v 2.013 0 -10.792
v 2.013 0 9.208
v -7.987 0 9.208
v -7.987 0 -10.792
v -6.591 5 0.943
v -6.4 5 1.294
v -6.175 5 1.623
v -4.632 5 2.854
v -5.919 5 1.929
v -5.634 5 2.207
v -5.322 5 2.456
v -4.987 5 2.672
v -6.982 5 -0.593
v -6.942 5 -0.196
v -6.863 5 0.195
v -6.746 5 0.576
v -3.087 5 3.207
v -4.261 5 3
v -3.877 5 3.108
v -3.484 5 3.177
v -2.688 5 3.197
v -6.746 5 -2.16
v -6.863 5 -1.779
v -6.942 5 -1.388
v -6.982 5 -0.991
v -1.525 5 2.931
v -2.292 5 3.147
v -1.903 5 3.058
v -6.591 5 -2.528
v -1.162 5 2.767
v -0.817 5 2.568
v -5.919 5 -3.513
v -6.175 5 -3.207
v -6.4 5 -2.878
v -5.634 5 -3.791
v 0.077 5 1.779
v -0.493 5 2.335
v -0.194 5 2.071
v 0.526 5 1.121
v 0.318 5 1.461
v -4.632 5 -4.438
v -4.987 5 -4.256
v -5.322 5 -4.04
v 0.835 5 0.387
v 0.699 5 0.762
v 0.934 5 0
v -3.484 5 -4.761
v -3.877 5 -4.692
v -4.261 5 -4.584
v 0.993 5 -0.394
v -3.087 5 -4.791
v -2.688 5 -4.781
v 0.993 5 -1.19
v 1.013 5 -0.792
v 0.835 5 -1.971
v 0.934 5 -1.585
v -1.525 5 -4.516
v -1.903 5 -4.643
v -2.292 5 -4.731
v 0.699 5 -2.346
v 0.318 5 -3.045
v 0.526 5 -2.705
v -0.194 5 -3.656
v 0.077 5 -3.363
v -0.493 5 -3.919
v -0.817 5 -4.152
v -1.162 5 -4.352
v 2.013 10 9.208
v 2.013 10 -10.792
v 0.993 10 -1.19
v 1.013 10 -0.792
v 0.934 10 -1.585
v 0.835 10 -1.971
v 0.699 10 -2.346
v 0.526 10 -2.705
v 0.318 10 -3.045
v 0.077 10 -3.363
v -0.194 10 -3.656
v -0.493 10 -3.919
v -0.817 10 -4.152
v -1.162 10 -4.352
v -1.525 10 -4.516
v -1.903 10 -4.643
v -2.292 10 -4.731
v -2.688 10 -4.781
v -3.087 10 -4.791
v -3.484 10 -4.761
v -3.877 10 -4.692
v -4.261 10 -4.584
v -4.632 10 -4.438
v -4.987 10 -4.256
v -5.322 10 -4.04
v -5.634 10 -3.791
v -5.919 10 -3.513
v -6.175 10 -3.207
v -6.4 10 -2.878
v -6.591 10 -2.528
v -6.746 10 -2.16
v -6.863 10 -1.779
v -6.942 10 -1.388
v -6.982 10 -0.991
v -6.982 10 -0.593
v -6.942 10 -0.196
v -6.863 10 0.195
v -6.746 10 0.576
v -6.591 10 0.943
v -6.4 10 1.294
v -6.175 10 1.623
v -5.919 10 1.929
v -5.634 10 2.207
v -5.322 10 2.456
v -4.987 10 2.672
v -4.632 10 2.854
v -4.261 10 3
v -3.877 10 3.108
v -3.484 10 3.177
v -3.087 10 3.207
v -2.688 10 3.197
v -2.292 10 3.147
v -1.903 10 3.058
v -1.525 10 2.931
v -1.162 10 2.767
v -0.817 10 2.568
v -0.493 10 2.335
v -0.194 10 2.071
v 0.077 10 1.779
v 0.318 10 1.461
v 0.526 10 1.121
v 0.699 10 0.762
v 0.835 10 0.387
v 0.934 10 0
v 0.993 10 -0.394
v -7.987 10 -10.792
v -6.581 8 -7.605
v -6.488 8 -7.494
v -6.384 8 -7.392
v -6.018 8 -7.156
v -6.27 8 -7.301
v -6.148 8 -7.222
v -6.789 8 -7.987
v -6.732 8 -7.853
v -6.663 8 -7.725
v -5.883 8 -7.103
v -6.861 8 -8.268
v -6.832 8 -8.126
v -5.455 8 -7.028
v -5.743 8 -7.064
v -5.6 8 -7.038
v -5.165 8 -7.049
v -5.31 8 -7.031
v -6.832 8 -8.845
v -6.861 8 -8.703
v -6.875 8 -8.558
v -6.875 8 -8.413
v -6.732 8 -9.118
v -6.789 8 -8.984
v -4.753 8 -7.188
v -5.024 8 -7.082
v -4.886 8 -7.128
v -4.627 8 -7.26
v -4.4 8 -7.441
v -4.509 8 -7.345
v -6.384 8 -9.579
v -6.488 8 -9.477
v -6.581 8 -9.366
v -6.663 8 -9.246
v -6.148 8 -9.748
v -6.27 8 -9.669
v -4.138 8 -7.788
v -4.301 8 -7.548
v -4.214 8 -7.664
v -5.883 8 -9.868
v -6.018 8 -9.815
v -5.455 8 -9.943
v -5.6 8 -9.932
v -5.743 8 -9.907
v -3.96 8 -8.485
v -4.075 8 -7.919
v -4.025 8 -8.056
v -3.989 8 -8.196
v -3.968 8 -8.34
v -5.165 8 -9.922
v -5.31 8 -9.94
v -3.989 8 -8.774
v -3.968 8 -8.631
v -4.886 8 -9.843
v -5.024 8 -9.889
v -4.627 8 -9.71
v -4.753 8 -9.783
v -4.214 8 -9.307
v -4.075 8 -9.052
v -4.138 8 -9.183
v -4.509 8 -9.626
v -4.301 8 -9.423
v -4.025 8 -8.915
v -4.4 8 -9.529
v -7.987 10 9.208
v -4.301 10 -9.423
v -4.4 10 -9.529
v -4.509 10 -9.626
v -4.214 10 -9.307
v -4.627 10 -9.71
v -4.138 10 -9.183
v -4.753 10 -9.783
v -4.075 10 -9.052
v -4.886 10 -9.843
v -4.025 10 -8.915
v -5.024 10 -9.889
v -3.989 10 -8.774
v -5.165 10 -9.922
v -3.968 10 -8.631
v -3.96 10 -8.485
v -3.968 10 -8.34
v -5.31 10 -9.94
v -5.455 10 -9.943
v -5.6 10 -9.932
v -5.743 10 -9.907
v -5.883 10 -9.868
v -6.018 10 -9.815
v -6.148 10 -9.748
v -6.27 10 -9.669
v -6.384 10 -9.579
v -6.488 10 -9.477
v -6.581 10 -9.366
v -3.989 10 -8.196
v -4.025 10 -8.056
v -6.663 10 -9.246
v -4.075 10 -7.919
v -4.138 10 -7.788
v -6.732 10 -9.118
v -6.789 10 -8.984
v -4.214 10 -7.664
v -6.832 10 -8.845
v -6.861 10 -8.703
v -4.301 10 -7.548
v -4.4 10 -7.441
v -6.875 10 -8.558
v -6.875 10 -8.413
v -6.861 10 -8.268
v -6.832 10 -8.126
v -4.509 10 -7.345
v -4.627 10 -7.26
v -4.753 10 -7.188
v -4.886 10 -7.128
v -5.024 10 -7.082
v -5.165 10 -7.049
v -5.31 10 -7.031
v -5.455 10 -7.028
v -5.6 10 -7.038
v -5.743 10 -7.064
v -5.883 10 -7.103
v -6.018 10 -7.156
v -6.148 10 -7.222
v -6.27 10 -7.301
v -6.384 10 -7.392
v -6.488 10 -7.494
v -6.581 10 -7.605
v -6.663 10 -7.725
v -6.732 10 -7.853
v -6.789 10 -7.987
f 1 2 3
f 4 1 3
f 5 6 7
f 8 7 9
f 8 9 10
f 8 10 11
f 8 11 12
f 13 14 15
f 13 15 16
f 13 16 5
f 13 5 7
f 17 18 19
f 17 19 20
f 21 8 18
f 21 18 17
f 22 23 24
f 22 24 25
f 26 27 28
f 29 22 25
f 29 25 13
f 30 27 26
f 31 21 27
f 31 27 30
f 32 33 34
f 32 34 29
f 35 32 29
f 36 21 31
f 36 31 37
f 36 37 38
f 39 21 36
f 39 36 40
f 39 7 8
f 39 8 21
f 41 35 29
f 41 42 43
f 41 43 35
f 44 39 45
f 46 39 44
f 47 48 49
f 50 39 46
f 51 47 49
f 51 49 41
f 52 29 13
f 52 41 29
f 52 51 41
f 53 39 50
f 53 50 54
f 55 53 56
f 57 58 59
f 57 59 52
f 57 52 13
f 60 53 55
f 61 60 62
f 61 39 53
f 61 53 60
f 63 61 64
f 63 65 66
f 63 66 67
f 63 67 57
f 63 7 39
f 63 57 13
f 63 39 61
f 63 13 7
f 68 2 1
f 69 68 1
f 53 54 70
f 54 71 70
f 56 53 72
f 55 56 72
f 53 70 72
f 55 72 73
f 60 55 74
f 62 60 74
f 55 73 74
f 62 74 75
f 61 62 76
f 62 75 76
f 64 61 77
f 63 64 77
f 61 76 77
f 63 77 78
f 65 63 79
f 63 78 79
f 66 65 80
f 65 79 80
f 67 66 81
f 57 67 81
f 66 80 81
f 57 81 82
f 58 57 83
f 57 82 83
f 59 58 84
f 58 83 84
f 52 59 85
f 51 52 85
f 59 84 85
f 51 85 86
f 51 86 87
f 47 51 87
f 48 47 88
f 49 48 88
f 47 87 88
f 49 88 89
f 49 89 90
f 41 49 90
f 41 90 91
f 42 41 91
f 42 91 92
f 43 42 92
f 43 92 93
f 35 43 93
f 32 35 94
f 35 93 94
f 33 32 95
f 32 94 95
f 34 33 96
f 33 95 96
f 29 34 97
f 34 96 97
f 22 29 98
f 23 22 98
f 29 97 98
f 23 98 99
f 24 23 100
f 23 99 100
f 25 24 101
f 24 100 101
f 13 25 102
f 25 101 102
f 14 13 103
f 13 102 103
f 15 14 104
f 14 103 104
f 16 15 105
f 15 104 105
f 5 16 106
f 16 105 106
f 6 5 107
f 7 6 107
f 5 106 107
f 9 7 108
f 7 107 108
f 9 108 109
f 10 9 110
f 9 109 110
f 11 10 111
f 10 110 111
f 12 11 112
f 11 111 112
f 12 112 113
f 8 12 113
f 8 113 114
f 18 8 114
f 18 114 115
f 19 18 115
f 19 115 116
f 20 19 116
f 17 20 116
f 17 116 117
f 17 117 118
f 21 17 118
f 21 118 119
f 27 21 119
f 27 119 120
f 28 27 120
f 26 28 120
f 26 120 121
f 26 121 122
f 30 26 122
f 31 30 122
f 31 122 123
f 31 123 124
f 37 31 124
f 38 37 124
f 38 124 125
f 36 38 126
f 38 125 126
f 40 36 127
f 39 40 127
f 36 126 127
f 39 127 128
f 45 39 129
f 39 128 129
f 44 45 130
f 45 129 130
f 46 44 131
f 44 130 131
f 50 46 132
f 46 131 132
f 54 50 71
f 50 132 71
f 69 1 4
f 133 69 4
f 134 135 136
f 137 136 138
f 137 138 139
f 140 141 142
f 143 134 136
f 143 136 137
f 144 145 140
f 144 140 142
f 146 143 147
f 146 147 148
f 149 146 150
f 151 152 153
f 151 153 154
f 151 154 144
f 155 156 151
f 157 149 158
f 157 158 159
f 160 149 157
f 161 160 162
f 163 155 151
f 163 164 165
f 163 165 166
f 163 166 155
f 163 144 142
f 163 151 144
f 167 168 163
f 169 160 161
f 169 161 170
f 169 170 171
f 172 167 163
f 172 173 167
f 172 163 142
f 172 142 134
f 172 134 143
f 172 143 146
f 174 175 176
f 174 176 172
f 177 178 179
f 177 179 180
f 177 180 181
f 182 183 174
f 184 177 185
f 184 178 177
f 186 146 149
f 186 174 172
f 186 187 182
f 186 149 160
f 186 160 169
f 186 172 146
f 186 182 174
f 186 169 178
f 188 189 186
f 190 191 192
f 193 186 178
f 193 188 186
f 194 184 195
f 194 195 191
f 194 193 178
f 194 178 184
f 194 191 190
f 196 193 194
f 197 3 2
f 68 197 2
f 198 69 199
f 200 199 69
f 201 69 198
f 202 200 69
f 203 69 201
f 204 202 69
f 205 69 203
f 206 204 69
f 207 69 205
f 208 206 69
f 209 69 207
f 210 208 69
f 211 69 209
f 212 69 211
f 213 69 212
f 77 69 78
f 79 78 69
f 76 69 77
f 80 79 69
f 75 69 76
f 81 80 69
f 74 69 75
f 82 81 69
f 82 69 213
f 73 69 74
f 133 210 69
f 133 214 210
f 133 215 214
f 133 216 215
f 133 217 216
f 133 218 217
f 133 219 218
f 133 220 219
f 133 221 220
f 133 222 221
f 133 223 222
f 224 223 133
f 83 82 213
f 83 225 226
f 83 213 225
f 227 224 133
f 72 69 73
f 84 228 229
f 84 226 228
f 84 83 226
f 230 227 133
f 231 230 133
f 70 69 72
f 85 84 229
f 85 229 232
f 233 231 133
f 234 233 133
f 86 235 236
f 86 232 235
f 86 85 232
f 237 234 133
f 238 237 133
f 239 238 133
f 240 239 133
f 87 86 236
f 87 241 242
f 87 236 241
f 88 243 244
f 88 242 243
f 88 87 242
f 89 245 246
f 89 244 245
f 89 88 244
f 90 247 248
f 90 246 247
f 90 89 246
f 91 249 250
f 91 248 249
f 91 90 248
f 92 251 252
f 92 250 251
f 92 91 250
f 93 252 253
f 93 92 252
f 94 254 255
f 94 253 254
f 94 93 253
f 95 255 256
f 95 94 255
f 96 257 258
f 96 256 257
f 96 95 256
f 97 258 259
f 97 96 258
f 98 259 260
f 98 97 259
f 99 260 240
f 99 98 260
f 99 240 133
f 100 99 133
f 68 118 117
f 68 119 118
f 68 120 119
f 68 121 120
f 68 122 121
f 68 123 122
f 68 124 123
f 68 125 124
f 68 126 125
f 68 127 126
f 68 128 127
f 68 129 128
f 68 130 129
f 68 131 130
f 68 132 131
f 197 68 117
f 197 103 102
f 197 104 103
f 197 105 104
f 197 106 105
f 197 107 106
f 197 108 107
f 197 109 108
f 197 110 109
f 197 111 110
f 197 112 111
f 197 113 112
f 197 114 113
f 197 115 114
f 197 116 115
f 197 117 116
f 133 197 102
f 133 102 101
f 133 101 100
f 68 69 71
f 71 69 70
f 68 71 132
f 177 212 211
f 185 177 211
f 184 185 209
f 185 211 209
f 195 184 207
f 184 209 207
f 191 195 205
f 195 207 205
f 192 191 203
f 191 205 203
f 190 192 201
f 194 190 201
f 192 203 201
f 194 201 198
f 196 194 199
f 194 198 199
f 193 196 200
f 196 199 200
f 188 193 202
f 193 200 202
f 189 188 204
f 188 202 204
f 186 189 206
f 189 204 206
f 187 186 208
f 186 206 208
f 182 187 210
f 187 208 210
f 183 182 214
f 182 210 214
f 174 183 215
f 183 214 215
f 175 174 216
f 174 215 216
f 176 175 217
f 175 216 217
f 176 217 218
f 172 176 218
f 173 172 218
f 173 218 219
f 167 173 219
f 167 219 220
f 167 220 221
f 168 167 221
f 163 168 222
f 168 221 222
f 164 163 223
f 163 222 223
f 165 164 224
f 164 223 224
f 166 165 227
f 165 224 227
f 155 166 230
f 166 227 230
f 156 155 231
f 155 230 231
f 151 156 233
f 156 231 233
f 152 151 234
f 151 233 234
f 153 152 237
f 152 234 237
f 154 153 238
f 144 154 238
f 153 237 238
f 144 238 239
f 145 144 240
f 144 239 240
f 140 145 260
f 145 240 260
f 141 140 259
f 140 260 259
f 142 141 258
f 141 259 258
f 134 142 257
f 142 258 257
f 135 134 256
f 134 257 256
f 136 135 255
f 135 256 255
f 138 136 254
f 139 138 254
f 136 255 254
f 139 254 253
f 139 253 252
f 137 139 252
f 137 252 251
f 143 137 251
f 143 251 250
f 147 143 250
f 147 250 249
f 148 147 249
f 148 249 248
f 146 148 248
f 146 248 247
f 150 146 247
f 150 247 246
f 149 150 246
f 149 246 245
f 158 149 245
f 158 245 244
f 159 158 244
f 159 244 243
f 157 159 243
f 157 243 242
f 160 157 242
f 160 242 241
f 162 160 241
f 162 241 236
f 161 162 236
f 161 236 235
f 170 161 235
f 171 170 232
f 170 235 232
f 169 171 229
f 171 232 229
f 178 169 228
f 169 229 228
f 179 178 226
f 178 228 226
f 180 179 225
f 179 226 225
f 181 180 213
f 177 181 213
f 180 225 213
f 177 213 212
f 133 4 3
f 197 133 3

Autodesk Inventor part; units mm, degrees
ref_plane "YZ Plane" through (0, 0, 0) normal (1, 0, 0) x (0, 1, 0)
ref_plane "XZ Plane" through (0, 0, 0) normal (0, 1, 0) x (-1, 0, 0)
ref_plane "XY Plane" through (0, 0, 0) normal (0, 0, 1) x (1, 0, 0)
sketch "Sketch1" plane through (0, 0, 0) normal (0, 1, 0) x (-1, 0, 0)
  line L0 (7.9868, 9.2079) -> (-2.0132, 9.2079)
  line L1 (-2.0132, 9.2079) -> (-2.0132, -10.7921)
  line L2 (-2.0132, -10.7921) -> (7.9868, -10.7921)
  line L3 (7.9868, -10.7921) -> (7.9868, 9.2079)
  point P0 (0, 0)
  dimension "height" = 20
  dimension "width" = 10
extrude "Extrusion1" add sketch "Sketch1" along normal blind 10
sketch "Sketch2" plane through (0, 10, 0) normal (0, 1, 0) x (1, 0, 0)
  line L0 (-7.9868, 10.7921) -> (-7.9868, -9.2079) construction
  line L1 (-7.9868, 0.7921) -> (2.0132, 0.7921) construction
  line L2 (2.0132, -9.2079) -> (2.0132, 10.7921) construction
  line L3 (-7.9868, -9.2079) -> (2.0132, -9.2079) construction
  line L4 (-2.9868, -9.2079) -> (-2.9868, 10.7921) construction
  line L5 (2.0132, 10.7921) -> (-7.9868, 10.7921) construction
  circle A0 centre (-2.9868, 0.7921) radius 4
  point P0 (0, 0)
  dimension "hole" = 8
extrude "Extrusion3" cut sketch "Sketch2" against normal blind 5
sketch "Sketch3" plane through (0, 10, 0) normal (0, 1, 0) x (1, 0, 0)
  circle A0 centre (-5.4186, 8.4854) radius 1.4583
  point P0 (0, 0)
extrude "Extrusion4" cut sketch "Sketch3" against normal blind 2
equation "\"width\" = 0.5 * height"
